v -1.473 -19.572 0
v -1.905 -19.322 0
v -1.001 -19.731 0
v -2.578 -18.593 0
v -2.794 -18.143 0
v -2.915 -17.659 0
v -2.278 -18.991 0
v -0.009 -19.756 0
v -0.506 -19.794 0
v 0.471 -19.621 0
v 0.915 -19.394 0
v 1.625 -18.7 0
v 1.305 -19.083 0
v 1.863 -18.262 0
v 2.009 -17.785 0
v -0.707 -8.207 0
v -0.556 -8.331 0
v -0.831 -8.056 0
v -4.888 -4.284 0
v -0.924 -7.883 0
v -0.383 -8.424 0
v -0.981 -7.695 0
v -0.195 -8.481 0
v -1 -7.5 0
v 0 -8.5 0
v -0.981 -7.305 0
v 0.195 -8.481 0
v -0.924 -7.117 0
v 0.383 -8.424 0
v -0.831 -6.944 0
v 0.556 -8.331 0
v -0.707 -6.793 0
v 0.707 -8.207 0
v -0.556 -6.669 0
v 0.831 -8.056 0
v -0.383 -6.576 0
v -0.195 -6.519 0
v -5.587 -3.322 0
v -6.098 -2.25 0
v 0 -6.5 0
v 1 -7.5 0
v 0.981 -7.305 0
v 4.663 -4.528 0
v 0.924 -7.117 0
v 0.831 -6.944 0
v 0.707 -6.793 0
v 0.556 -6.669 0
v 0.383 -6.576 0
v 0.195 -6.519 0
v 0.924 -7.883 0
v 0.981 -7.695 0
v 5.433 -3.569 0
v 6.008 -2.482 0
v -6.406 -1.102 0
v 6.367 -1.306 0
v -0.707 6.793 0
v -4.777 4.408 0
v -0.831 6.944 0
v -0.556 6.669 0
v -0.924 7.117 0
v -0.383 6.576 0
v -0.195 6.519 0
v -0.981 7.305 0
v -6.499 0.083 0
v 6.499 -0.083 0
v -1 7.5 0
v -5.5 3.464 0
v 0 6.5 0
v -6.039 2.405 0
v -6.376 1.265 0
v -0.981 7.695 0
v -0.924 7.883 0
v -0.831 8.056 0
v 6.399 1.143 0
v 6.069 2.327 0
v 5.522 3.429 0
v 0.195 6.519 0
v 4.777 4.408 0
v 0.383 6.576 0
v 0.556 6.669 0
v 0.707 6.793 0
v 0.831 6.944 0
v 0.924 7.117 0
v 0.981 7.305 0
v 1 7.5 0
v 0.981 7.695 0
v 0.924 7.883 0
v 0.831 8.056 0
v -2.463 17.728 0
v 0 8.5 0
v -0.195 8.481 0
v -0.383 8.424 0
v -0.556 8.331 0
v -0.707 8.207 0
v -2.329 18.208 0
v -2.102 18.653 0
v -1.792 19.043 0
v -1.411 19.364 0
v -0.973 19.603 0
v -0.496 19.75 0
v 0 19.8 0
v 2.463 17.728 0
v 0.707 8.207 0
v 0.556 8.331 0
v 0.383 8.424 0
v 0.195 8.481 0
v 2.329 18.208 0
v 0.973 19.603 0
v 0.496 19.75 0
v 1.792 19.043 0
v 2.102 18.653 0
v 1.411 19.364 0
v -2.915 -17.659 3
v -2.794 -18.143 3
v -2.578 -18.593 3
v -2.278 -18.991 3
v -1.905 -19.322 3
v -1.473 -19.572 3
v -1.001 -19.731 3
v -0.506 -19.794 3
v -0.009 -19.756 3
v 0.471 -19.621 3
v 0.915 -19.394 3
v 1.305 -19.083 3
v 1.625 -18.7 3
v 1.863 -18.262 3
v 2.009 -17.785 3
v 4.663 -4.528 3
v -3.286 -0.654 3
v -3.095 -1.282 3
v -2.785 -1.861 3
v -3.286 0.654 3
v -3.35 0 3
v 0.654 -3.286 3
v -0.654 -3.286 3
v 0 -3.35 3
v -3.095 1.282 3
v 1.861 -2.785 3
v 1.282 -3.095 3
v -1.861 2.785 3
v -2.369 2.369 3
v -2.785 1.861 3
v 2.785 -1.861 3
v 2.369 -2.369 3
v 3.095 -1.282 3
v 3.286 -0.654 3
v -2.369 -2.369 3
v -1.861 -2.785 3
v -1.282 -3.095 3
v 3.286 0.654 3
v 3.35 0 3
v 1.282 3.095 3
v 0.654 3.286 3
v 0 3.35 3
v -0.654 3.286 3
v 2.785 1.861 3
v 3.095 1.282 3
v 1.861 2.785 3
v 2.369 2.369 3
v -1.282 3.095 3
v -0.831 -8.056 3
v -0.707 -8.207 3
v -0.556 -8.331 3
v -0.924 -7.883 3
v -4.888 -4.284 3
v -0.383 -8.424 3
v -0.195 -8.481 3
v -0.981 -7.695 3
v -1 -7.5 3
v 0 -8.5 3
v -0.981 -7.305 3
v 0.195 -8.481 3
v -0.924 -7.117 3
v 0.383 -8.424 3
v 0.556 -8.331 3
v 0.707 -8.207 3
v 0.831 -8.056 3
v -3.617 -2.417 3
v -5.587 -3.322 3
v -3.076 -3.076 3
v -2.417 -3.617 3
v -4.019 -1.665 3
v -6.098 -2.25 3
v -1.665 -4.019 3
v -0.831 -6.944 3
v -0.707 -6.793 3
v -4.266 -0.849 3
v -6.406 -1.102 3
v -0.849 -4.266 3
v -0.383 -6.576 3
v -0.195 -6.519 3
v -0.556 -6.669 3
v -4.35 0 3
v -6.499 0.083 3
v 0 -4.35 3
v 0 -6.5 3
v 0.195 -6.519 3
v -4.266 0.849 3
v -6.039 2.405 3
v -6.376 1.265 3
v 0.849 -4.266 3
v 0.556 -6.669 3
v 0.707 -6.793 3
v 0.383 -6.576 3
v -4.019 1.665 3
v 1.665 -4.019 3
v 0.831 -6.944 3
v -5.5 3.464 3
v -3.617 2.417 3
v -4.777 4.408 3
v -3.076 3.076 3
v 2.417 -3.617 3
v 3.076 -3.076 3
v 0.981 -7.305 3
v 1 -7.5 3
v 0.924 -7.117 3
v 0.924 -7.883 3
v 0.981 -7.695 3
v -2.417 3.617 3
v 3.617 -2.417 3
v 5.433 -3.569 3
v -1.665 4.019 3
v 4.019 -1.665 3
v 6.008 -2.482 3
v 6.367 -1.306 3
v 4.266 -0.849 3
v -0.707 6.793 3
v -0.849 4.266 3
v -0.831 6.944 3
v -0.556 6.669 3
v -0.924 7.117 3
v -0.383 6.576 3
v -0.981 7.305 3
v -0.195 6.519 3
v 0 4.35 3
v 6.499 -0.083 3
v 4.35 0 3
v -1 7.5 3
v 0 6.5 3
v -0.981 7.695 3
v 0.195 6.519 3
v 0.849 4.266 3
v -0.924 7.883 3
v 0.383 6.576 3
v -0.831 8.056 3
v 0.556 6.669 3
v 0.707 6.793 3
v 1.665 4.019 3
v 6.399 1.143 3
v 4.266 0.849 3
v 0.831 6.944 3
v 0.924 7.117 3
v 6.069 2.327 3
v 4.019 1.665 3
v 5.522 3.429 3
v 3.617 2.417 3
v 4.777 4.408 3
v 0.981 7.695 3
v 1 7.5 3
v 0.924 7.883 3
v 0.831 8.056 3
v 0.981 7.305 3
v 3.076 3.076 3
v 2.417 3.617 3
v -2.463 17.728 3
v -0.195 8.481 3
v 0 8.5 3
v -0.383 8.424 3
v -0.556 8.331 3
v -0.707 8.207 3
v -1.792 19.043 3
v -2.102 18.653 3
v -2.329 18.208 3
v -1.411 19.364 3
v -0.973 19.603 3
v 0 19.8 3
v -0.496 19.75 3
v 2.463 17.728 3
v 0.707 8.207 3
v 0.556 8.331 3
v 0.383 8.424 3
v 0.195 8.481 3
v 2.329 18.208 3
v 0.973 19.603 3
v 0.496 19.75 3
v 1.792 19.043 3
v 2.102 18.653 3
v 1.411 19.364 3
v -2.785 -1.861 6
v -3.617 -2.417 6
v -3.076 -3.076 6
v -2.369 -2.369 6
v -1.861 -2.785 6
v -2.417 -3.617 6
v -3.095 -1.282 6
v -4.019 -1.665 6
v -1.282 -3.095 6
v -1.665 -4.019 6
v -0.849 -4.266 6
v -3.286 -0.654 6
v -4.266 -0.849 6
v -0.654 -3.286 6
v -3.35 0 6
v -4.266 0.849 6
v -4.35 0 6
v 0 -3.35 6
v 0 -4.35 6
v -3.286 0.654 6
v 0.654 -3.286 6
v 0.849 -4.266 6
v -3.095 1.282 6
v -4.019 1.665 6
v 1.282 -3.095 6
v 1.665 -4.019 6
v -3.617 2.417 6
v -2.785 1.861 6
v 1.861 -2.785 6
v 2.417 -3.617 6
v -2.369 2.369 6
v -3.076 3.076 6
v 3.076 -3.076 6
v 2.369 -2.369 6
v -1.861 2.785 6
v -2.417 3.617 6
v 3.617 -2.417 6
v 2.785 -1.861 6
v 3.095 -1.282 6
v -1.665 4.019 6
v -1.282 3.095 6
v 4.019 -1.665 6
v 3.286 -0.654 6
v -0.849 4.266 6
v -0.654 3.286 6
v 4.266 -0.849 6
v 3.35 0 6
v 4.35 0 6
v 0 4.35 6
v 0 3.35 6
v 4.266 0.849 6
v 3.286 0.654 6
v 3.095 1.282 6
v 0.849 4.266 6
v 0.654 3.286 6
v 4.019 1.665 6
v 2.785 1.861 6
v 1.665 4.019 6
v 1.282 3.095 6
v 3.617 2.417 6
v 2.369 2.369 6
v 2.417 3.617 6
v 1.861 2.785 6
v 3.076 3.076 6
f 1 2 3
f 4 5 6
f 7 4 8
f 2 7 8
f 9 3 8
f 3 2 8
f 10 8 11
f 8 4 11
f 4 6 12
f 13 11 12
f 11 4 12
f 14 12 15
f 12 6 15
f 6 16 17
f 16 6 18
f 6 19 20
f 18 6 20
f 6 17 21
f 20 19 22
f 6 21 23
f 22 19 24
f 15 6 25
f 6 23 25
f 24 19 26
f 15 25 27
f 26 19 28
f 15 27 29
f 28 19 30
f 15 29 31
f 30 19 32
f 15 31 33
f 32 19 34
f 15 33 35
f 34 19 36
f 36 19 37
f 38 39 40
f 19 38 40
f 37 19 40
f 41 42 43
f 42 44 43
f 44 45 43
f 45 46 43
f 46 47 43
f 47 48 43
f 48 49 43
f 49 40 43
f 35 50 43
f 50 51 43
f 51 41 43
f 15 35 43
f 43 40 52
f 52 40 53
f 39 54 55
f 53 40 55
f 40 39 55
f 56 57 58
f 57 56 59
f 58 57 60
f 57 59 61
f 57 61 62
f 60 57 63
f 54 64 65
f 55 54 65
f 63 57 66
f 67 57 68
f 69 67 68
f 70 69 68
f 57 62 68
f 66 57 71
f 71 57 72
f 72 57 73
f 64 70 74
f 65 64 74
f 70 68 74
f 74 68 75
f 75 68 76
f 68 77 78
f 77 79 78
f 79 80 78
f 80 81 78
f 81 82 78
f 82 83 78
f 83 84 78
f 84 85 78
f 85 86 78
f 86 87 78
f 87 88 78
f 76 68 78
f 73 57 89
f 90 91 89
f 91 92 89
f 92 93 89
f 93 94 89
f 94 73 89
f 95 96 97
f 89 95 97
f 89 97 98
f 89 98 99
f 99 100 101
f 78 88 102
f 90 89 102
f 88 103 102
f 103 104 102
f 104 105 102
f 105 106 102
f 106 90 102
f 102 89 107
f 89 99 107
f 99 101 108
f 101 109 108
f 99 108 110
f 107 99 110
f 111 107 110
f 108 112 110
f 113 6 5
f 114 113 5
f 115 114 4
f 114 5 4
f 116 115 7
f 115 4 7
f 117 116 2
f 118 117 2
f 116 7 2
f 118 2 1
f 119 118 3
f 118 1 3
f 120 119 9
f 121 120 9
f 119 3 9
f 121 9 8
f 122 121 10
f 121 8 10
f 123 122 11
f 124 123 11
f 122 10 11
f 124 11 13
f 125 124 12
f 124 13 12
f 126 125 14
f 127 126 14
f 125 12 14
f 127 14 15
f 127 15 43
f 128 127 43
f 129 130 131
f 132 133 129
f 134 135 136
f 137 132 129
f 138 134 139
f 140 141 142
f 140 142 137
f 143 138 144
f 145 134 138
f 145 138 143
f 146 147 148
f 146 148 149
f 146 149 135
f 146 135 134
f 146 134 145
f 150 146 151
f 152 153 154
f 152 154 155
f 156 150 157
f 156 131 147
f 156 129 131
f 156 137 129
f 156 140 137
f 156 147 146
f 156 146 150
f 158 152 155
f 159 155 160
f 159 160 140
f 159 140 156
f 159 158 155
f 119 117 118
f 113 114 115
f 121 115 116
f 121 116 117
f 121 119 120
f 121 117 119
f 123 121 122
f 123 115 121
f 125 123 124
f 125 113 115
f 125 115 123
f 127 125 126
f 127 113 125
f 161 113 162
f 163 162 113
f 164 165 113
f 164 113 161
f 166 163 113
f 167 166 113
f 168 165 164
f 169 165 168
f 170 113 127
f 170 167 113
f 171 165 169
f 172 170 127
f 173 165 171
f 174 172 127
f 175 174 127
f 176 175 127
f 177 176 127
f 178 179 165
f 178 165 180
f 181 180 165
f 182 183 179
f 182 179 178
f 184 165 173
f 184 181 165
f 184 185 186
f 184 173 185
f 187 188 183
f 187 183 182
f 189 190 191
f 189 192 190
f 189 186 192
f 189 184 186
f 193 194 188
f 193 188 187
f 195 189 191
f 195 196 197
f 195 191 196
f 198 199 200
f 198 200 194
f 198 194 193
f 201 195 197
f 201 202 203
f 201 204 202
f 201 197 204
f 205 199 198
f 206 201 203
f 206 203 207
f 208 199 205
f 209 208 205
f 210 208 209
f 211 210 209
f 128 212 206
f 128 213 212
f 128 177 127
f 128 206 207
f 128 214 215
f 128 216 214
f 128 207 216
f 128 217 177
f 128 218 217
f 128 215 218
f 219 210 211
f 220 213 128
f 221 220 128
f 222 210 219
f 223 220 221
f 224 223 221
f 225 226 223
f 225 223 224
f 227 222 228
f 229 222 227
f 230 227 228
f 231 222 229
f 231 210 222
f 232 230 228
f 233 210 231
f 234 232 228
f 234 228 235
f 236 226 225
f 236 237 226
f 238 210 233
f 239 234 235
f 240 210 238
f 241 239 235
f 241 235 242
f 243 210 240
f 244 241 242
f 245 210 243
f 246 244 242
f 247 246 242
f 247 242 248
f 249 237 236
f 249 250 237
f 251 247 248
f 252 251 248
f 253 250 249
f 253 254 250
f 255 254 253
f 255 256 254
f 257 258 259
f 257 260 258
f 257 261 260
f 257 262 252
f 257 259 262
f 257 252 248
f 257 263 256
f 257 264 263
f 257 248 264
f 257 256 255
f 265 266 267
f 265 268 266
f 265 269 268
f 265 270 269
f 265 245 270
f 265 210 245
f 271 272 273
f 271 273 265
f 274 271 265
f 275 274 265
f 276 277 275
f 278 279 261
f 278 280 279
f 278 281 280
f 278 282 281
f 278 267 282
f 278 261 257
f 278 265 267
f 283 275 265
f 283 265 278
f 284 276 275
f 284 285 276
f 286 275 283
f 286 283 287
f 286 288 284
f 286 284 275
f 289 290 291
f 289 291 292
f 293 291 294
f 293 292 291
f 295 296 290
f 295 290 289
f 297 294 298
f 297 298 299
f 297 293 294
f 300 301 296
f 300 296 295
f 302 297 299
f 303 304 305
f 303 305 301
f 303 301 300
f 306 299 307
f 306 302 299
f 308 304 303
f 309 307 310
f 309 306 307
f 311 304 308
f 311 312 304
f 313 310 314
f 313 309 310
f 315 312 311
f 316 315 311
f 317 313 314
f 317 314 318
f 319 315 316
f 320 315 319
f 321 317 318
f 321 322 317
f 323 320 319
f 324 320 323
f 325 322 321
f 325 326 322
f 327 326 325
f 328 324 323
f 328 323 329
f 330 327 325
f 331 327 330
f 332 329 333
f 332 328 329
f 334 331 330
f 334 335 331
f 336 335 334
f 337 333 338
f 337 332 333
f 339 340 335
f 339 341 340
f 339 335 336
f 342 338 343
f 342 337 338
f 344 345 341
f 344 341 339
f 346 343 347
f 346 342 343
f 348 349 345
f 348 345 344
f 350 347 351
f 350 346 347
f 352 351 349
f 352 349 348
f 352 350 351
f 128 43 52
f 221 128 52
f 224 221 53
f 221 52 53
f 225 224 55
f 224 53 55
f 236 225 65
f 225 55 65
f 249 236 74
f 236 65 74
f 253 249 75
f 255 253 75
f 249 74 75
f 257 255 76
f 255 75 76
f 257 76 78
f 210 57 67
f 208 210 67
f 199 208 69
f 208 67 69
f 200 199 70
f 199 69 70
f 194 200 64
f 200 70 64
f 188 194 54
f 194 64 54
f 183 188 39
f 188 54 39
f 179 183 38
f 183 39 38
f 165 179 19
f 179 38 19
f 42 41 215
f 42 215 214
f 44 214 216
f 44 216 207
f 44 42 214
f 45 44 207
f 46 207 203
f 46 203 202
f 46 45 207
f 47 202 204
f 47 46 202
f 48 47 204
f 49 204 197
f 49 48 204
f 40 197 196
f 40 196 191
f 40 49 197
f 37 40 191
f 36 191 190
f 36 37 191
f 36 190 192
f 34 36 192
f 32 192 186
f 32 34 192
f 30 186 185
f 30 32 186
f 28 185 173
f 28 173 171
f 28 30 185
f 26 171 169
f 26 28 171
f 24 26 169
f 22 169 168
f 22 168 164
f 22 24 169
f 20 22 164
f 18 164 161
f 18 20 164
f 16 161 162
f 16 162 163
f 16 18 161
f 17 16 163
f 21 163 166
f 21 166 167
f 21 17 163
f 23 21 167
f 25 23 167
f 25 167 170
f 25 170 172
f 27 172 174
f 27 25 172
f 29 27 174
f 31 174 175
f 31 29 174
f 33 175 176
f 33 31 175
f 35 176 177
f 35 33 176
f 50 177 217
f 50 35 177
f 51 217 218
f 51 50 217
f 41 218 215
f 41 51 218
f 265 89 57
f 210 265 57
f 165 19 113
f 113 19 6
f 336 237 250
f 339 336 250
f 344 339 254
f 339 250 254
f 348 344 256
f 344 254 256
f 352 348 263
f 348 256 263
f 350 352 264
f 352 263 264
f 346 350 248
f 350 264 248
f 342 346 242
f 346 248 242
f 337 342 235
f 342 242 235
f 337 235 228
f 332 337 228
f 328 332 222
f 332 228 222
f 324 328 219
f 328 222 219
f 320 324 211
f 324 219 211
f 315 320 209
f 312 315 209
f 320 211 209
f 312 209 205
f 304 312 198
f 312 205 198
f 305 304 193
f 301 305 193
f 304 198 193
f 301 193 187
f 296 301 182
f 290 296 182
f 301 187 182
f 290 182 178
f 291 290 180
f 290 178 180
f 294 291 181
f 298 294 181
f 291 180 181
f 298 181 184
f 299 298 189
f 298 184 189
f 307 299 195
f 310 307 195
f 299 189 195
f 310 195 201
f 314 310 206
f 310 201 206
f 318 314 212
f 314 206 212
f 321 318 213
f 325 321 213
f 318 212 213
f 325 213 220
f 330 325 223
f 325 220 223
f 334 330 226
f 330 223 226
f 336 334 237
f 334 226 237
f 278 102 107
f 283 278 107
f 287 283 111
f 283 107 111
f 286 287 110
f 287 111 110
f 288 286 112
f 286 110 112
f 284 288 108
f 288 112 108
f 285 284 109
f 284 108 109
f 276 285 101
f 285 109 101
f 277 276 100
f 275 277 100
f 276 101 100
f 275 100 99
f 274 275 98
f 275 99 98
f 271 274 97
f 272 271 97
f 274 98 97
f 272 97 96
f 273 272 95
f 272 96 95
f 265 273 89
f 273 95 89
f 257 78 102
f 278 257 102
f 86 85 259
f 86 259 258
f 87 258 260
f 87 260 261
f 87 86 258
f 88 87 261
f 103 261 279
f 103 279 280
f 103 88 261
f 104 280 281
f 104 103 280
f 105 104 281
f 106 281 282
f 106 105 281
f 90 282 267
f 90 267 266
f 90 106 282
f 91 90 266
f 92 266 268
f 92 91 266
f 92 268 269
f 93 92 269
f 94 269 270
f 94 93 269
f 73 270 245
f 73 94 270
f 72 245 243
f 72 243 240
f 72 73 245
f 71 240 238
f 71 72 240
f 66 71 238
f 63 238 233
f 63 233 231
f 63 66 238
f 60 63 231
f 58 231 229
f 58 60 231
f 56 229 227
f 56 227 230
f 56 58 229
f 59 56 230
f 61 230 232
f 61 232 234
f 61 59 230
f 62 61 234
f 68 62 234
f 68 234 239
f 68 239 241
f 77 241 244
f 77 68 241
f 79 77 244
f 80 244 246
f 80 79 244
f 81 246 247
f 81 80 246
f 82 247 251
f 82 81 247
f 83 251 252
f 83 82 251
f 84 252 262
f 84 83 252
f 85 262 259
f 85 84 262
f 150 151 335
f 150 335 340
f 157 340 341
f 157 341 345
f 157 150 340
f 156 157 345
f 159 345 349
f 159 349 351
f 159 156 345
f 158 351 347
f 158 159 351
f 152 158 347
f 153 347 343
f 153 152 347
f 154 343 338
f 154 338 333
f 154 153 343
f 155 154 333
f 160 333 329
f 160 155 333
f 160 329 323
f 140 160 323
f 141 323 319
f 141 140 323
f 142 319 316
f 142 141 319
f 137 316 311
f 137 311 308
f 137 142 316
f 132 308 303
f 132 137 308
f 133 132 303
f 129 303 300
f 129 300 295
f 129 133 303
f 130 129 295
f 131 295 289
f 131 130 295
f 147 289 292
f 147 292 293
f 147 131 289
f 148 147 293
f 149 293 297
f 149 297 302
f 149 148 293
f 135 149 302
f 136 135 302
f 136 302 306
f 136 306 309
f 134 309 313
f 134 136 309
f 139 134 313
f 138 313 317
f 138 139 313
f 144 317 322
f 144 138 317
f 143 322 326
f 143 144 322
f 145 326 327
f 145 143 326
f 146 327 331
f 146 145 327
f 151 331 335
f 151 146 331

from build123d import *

# Parameters (mm, degrees)
SKETCH_1_R        = 1
EXTRUDE_1_DEPTH   = 3
SKETCH_2_R        = 4.35
SKETCH_2_R_2      = 3.35
EXTRUDE_1_2_DEPTH = 3


with BuildPart() as part:
    # 草图1 → Extrude 1 (new body)
    with BuildSketch(Plane.XY):
        with BuildLine():
            Line((-2.463104237, 17.727922325), (-4.777267611, 4.407688076))
            ThreePointArc((-4.777267611, 4.407688076), (-6.49946928, 0.083060663), (-4.888346081, -4.284165332))
            Line((-4.888346081, -4.284165332), (-2.915337598, -17.659187952))
            ThreePointArc((-2.915337598, -17.659187952), (-0.505989798, -19.793533649), (2.009262058, -17.785077409))
            Line((2.009262058, -17.785077409), (4.663068788, -4.528331865))
            ThreePointArc((4.663068788, -4.528331865), (6.49946928, -0.083060663), (4.777267611, 4.407688076))
            Line((4.777267611, 4.407688076), (2.463104237, 17.727922325))
            ThreePointArc((2.463104237, 17.727922325), (0, 19.8), (-2.463104237, 17.727922325))
        make_face()
        with Locations((0, 7.5)):
            Circle(SKETCH_1_R, mode=Mode.SUBTRACT)
        with Locations((0, -7.5)):
            Circle(SKETCH_1_R, mode=Mode.SUBTRACT)
    extrude(amount=EXTRUDE_1_DEPTH)

    # 草图2 → Extrude 1 2 (add)
    with BuildSketch(Plane.XY.offset(3)):
        Circle(SKETCH_2_R)
        Circle(SKETCH_2_R_2, mode=Mode.SUBTRACT)
    extrude(amount=EXTRUDE_1_2_DEPTH)


solid = part.part
